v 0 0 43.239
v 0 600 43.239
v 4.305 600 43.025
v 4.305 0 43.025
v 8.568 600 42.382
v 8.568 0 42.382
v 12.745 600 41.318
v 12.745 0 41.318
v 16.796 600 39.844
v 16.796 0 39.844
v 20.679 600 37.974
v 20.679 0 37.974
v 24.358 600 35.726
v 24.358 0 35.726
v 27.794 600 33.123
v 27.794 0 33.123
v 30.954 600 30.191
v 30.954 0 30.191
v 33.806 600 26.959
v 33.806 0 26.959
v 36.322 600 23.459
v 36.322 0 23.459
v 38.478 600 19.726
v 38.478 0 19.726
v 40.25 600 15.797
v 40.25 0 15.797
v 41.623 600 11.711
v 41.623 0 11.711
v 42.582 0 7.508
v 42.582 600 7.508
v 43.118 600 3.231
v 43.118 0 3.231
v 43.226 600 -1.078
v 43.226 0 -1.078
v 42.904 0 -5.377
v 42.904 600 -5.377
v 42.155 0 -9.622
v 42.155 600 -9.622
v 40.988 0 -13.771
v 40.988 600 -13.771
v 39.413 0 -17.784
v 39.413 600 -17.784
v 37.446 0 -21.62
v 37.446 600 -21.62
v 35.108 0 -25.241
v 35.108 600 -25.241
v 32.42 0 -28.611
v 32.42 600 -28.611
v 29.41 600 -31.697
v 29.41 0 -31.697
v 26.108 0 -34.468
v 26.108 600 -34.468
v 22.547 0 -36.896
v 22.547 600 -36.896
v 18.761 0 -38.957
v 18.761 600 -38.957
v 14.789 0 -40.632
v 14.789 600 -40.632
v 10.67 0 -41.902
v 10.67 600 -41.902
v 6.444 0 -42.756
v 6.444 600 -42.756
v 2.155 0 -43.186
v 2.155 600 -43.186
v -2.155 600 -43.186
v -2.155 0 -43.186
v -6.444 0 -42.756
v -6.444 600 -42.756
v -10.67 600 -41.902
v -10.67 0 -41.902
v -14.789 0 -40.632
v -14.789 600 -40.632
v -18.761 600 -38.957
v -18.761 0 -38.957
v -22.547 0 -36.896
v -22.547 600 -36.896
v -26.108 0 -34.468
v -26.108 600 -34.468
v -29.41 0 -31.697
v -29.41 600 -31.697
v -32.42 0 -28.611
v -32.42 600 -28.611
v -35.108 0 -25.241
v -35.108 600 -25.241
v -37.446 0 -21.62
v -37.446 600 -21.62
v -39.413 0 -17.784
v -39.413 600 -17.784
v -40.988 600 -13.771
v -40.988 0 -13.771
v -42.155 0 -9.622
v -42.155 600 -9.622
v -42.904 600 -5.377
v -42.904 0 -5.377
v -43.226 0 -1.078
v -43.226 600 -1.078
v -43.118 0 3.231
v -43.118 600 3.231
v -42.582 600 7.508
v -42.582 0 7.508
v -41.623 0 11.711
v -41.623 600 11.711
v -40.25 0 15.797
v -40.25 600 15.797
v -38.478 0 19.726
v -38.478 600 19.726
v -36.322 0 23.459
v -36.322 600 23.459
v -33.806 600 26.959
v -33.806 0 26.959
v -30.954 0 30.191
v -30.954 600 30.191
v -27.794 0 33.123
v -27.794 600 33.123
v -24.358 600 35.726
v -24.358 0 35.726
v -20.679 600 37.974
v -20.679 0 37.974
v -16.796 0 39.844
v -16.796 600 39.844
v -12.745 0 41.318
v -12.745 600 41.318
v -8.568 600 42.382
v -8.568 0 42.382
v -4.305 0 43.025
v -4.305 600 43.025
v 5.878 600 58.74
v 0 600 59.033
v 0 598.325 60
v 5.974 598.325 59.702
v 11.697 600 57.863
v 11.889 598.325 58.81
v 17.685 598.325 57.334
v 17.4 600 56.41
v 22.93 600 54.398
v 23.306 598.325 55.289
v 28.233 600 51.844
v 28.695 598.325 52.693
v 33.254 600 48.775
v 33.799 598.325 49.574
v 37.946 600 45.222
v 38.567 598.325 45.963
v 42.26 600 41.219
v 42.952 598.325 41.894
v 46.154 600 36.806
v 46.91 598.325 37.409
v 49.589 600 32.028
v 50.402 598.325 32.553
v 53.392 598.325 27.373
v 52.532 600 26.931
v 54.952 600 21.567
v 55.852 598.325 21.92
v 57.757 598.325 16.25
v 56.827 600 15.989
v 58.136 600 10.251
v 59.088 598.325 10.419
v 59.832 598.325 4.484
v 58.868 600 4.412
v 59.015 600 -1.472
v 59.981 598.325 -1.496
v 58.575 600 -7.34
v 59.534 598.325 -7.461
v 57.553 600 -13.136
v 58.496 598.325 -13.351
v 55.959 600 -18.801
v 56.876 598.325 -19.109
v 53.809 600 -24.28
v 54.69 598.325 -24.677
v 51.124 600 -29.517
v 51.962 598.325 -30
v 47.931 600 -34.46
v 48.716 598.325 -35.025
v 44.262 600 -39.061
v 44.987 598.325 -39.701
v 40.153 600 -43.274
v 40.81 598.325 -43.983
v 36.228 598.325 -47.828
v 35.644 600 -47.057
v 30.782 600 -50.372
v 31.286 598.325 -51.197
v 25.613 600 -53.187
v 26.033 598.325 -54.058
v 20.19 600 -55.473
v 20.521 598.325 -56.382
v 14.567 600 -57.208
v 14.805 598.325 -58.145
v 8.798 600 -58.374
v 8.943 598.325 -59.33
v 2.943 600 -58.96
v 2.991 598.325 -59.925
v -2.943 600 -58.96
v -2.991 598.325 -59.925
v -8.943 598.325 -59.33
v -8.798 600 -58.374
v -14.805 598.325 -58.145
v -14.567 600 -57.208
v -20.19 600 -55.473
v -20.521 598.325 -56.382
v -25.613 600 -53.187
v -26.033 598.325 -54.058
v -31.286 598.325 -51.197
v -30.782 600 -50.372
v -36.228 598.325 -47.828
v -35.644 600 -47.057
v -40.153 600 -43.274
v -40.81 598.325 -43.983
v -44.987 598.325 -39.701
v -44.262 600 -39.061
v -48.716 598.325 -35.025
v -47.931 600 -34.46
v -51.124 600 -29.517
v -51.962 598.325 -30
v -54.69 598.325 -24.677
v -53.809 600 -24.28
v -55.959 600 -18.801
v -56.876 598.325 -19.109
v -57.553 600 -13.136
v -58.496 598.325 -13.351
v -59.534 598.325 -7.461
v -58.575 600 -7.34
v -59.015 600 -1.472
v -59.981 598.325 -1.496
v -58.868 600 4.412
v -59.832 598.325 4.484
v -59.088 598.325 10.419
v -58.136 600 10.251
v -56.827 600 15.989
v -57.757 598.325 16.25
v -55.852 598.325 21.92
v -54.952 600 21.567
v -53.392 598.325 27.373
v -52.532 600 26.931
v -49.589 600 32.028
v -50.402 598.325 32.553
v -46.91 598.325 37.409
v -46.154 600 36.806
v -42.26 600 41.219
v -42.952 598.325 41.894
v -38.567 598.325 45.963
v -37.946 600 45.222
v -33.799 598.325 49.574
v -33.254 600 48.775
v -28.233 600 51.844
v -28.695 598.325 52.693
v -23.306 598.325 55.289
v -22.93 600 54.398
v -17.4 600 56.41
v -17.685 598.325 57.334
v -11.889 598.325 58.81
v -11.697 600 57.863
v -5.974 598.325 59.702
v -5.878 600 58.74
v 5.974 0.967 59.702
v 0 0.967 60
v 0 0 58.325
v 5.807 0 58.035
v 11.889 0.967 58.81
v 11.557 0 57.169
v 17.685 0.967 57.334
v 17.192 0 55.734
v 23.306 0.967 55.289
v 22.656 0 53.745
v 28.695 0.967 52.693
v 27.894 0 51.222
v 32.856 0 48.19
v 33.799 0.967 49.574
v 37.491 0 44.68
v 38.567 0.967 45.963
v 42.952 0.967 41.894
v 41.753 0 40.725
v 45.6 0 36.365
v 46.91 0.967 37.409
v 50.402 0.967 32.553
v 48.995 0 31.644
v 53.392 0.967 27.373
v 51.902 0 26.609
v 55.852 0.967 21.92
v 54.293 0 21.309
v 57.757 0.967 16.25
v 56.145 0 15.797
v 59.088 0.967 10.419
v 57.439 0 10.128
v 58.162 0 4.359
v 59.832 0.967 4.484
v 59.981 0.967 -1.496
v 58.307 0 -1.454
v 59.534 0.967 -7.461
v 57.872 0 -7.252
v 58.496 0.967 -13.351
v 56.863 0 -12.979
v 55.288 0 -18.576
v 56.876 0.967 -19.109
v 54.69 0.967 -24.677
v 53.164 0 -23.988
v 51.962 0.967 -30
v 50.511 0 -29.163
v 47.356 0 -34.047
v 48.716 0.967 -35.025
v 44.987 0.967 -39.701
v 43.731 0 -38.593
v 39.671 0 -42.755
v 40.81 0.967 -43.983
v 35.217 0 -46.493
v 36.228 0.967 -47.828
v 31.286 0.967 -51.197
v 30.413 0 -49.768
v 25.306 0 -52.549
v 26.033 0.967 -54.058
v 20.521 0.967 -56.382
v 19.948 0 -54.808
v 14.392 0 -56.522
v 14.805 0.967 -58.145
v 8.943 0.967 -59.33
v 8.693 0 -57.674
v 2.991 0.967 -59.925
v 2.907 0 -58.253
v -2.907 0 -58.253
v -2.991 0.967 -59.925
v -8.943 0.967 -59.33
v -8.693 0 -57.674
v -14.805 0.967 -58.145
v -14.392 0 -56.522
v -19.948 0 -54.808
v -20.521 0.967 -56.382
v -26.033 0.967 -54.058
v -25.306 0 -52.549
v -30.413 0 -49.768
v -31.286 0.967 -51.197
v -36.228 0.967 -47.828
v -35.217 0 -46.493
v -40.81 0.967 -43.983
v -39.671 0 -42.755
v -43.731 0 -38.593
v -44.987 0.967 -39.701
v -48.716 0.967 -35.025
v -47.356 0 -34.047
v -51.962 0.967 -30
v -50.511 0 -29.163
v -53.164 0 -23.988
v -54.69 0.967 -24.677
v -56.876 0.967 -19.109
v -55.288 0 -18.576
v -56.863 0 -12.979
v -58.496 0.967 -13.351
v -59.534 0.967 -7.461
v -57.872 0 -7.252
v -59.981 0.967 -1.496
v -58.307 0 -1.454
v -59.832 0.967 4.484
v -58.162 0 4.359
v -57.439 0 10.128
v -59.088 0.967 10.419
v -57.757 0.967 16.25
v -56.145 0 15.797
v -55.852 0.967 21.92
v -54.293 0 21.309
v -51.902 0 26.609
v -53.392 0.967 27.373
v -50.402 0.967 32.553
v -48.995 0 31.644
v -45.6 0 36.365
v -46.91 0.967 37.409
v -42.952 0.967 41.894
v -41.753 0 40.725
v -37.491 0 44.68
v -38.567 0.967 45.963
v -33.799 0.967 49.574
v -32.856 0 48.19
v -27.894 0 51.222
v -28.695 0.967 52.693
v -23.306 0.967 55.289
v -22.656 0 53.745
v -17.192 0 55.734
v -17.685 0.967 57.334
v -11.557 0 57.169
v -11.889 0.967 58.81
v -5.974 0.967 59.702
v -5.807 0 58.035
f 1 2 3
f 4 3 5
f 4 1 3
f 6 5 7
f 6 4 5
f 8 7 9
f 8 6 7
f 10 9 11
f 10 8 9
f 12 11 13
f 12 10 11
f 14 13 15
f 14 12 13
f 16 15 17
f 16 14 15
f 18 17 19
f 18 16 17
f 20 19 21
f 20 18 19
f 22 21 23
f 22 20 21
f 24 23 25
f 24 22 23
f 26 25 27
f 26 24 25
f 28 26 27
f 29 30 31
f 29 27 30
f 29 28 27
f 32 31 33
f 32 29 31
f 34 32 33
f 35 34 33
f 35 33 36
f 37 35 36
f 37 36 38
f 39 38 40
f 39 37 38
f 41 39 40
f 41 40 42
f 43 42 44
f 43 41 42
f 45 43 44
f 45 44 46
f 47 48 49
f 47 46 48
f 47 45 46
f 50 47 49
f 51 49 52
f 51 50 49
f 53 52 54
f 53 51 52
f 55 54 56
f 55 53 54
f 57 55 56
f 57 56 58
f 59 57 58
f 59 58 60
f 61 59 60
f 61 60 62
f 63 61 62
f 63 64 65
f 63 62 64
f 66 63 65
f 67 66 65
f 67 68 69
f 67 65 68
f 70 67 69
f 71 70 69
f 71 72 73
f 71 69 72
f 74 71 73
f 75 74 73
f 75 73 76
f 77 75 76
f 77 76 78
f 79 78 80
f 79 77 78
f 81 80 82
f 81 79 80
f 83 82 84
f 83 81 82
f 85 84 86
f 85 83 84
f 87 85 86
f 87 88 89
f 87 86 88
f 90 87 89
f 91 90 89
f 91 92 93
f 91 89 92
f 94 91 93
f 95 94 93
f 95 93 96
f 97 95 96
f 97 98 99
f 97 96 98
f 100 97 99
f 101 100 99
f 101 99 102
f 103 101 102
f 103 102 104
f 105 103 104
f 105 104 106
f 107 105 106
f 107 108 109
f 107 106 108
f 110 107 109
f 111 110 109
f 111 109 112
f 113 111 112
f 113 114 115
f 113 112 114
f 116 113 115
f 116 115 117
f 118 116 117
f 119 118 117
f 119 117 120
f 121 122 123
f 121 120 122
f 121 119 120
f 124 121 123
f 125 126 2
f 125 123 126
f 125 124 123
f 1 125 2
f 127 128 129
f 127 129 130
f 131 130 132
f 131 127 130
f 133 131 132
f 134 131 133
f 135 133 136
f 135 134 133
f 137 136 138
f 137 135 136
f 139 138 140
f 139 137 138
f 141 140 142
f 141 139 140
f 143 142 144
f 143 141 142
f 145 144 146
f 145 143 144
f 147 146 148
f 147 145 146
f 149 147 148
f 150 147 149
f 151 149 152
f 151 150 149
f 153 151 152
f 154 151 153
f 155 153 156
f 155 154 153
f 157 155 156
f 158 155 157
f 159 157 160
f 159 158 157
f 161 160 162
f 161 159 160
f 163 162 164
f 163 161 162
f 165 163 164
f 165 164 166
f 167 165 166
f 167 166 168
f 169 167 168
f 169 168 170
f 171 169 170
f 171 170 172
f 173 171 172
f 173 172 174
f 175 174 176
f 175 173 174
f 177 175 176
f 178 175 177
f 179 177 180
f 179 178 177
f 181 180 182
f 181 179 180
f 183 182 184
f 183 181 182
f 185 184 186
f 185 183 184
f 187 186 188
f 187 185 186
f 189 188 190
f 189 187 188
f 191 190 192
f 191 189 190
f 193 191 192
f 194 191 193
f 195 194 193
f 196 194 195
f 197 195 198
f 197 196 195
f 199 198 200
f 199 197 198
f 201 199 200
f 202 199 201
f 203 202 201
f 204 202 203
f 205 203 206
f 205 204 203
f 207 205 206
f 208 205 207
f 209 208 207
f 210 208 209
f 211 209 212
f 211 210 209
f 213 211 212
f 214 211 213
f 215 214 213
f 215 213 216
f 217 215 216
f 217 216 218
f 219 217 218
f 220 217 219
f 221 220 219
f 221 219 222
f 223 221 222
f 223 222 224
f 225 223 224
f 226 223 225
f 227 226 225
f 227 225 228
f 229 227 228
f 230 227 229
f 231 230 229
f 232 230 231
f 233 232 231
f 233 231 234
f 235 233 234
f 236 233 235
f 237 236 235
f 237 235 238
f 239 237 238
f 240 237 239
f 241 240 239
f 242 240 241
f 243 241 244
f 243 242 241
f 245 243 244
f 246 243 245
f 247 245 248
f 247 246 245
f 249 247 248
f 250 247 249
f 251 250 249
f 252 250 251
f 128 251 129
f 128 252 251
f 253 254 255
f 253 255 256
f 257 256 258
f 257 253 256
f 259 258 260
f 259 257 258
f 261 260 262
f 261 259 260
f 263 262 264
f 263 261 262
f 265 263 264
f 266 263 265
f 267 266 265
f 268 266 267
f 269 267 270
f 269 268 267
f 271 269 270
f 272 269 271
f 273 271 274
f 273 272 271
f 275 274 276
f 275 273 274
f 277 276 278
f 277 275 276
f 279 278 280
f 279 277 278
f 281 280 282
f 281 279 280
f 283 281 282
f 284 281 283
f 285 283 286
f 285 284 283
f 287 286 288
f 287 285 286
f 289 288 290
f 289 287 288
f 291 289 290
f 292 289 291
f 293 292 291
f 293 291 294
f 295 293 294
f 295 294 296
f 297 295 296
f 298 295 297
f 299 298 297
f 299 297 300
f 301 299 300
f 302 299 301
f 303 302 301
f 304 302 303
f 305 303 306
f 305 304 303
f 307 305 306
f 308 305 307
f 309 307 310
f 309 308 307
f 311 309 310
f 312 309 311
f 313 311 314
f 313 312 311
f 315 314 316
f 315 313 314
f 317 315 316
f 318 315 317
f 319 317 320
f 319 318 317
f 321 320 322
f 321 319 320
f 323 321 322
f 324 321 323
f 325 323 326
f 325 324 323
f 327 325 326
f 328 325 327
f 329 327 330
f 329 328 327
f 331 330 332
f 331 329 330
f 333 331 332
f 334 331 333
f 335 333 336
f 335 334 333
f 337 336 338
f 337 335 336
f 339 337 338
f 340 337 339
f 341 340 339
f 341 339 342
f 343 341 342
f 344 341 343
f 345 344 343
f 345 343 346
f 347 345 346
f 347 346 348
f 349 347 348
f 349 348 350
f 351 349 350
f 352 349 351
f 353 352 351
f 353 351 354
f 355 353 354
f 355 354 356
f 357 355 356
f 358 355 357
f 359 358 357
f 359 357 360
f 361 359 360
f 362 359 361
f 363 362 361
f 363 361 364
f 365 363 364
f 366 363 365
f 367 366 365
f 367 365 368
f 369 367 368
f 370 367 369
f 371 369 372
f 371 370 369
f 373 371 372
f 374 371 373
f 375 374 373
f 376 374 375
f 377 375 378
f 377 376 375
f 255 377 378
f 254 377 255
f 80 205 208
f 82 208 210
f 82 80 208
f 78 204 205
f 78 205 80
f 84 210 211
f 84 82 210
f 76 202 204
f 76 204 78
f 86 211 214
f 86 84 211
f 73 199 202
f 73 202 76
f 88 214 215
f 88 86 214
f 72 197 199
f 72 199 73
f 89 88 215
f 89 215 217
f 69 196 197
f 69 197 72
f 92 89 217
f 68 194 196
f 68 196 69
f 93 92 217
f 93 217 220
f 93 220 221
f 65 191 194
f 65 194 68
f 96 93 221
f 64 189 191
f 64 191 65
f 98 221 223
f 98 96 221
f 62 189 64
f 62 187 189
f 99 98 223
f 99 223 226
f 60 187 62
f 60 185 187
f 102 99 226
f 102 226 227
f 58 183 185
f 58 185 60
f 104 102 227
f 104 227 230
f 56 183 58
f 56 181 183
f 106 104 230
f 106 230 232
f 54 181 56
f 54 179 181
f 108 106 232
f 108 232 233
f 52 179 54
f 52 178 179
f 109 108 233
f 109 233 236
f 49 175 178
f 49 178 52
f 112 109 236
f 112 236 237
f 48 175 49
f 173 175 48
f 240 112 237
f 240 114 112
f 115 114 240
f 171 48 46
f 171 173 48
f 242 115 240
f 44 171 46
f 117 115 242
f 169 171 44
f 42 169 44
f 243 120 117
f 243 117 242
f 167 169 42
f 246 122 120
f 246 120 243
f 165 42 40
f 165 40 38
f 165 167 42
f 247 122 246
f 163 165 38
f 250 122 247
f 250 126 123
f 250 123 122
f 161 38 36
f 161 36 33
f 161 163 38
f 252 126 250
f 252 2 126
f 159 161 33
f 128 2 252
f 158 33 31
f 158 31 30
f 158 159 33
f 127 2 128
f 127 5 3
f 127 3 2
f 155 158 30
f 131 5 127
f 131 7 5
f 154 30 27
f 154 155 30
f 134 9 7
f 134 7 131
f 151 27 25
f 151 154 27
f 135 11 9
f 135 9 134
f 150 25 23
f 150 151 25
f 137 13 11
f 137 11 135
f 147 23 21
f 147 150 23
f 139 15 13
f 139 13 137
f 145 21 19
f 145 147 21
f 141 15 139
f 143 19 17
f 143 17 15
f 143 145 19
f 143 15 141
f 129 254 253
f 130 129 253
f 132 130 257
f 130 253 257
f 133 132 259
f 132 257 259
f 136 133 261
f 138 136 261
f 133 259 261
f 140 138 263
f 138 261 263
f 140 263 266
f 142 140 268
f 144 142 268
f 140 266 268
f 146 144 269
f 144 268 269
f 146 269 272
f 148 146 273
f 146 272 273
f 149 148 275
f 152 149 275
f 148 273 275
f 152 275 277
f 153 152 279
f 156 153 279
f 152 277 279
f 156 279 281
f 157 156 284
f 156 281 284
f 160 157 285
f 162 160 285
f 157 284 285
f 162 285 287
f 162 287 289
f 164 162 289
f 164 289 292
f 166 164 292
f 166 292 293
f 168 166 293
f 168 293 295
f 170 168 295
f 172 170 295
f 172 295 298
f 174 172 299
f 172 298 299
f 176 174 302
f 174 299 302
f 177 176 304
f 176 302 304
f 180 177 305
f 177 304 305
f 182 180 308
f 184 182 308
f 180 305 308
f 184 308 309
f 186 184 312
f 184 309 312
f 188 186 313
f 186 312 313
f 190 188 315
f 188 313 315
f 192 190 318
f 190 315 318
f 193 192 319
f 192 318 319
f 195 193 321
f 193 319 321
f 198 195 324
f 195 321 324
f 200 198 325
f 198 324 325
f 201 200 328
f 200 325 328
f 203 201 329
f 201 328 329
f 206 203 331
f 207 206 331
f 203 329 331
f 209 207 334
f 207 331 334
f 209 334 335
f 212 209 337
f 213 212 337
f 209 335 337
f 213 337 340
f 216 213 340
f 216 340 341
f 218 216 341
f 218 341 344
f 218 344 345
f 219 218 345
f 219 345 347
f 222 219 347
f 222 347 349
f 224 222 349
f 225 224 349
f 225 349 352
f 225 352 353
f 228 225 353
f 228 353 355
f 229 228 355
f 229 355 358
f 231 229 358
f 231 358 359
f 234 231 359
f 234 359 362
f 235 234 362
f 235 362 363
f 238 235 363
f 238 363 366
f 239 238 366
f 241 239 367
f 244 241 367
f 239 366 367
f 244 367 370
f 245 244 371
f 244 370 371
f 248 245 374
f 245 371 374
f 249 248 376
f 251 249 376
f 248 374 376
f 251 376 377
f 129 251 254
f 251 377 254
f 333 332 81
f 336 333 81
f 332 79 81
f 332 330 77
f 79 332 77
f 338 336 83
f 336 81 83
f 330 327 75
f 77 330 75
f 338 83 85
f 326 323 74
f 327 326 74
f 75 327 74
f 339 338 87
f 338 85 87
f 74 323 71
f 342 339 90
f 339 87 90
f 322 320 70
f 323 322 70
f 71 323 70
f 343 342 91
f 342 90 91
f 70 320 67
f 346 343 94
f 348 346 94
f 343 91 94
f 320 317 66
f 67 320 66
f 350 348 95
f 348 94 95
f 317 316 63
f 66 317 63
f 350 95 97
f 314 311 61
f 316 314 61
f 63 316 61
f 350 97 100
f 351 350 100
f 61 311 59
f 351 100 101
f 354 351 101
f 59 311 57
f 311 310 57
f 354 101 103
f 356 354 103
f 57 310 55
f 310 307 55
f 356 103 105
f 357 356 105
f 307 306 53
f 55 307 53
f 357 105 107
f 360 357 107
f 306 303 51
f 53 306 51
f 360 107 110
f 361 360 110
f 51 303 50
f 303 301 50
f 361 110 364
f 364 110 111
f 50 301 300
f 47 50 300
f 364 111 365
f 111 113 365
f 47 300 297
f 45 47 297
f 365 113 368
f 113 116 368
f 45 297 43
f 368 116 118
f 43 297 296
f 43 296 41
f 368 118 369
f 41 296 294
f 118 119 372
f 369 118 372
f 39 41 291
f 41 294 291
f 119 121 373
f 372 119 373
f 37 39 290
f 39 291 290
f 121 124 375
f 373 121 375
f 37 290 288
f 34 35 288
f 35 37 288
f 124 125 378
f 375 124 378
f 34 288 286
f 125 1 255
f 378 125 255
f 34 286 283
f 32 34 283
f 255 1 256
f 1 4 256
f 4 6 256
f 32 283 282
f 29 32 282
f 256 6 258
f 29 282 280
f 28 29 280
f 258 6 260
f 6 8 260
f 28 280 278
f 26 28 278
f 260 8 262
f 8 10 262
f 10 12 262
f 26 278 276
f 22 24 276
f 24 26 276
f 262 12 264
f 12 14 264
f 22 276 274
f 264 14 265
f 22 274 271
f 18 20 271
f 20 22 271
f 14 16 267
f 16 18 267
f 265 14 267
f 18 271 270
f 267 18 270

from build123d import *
from OCP.BRepFilletAPI import BRepFilletAPI_MakeChamfer

# Parameters (mm, degrees)
SKETCH1_R           = 60
BOSS_EXTRUDE1_DEPTH = 600
SKETCH2_R           = 43.239378985
CUT_EXTRUDE1_DEPTH  = 606.970296302
CHAMFER1_SIZE       = 1.674878005
CHAMFER1_SIZE2      = 0.966991267


with BuildPart() as part:
    # Sketch1 → Boss-Extrude1 (new body)
    with BuildSketch(Plane(origin=(0, 0, 0), x_dir=(1, 0, 0), z_dir=(0, 1, 0))):
        Circle(SKETCH1_R)
    extrude(amount=BOSS_EXTRUDE1_DEPTH)

    # Sketch2 → Cut-Extrude1 (cut, through all)
    with BuildSketch(Plane(origin=(0, 0, 0), x_dir=(1, 0, 0), z_dir=(0, 1, 0))):
        Circle(SKETCH2_R)
    extrude(amount=CUT_EXTRUDE1_DEPTH, mode=Mode.SUBTRACT)

    # Chamfer1: one chamfer whose edges measure the first distance from different faces: ONE call of the kernel's chamfer builder (chamfer() names one face for all edges)
    chamfer1_edges_1 = [part.edges().sort_by_distance(p)[0] for p in [
        (-60, 600, 0),
    ]]
    chamfer1_side_1 = [part.faces().sort_by_distance(p)[0] for p in [
        (-60, 300, 0),
    ]]
    chamfer1_edges_2 = [part.edges().sort_by_distance(p)[0] for p in [
        (-60, 0, 0),
    ]]
    chamfer1_side_2 = [part.faces().sort_by_distance(p)[0] for p in [
        (-58.302943725, 0, 0),
    ]]
    chamfer1 = BRepFilletAPI_MakeChamfer(part.part.solid().wrapped)
    for e in chamfer1_edges_1:
        chamfer1.Add(CHAMFER1_SIZE, CHAMFER1_SIZE2, e.wrapped, chamfer1_side_1[0].wrapped)  # the first distance lies on this face
    for e in chamfer1_edges_2:
        chamfer1.Add(CHAMFER1_SIZE, CHAMFER1_SIZE2, e.wrapped, chamfer1_side_2[0].wrapped)  # the first distance lies on this face
    add(Compound.cast(chamfer1.Shape()), mode=Mode.REPLACE)


solid = part.part
